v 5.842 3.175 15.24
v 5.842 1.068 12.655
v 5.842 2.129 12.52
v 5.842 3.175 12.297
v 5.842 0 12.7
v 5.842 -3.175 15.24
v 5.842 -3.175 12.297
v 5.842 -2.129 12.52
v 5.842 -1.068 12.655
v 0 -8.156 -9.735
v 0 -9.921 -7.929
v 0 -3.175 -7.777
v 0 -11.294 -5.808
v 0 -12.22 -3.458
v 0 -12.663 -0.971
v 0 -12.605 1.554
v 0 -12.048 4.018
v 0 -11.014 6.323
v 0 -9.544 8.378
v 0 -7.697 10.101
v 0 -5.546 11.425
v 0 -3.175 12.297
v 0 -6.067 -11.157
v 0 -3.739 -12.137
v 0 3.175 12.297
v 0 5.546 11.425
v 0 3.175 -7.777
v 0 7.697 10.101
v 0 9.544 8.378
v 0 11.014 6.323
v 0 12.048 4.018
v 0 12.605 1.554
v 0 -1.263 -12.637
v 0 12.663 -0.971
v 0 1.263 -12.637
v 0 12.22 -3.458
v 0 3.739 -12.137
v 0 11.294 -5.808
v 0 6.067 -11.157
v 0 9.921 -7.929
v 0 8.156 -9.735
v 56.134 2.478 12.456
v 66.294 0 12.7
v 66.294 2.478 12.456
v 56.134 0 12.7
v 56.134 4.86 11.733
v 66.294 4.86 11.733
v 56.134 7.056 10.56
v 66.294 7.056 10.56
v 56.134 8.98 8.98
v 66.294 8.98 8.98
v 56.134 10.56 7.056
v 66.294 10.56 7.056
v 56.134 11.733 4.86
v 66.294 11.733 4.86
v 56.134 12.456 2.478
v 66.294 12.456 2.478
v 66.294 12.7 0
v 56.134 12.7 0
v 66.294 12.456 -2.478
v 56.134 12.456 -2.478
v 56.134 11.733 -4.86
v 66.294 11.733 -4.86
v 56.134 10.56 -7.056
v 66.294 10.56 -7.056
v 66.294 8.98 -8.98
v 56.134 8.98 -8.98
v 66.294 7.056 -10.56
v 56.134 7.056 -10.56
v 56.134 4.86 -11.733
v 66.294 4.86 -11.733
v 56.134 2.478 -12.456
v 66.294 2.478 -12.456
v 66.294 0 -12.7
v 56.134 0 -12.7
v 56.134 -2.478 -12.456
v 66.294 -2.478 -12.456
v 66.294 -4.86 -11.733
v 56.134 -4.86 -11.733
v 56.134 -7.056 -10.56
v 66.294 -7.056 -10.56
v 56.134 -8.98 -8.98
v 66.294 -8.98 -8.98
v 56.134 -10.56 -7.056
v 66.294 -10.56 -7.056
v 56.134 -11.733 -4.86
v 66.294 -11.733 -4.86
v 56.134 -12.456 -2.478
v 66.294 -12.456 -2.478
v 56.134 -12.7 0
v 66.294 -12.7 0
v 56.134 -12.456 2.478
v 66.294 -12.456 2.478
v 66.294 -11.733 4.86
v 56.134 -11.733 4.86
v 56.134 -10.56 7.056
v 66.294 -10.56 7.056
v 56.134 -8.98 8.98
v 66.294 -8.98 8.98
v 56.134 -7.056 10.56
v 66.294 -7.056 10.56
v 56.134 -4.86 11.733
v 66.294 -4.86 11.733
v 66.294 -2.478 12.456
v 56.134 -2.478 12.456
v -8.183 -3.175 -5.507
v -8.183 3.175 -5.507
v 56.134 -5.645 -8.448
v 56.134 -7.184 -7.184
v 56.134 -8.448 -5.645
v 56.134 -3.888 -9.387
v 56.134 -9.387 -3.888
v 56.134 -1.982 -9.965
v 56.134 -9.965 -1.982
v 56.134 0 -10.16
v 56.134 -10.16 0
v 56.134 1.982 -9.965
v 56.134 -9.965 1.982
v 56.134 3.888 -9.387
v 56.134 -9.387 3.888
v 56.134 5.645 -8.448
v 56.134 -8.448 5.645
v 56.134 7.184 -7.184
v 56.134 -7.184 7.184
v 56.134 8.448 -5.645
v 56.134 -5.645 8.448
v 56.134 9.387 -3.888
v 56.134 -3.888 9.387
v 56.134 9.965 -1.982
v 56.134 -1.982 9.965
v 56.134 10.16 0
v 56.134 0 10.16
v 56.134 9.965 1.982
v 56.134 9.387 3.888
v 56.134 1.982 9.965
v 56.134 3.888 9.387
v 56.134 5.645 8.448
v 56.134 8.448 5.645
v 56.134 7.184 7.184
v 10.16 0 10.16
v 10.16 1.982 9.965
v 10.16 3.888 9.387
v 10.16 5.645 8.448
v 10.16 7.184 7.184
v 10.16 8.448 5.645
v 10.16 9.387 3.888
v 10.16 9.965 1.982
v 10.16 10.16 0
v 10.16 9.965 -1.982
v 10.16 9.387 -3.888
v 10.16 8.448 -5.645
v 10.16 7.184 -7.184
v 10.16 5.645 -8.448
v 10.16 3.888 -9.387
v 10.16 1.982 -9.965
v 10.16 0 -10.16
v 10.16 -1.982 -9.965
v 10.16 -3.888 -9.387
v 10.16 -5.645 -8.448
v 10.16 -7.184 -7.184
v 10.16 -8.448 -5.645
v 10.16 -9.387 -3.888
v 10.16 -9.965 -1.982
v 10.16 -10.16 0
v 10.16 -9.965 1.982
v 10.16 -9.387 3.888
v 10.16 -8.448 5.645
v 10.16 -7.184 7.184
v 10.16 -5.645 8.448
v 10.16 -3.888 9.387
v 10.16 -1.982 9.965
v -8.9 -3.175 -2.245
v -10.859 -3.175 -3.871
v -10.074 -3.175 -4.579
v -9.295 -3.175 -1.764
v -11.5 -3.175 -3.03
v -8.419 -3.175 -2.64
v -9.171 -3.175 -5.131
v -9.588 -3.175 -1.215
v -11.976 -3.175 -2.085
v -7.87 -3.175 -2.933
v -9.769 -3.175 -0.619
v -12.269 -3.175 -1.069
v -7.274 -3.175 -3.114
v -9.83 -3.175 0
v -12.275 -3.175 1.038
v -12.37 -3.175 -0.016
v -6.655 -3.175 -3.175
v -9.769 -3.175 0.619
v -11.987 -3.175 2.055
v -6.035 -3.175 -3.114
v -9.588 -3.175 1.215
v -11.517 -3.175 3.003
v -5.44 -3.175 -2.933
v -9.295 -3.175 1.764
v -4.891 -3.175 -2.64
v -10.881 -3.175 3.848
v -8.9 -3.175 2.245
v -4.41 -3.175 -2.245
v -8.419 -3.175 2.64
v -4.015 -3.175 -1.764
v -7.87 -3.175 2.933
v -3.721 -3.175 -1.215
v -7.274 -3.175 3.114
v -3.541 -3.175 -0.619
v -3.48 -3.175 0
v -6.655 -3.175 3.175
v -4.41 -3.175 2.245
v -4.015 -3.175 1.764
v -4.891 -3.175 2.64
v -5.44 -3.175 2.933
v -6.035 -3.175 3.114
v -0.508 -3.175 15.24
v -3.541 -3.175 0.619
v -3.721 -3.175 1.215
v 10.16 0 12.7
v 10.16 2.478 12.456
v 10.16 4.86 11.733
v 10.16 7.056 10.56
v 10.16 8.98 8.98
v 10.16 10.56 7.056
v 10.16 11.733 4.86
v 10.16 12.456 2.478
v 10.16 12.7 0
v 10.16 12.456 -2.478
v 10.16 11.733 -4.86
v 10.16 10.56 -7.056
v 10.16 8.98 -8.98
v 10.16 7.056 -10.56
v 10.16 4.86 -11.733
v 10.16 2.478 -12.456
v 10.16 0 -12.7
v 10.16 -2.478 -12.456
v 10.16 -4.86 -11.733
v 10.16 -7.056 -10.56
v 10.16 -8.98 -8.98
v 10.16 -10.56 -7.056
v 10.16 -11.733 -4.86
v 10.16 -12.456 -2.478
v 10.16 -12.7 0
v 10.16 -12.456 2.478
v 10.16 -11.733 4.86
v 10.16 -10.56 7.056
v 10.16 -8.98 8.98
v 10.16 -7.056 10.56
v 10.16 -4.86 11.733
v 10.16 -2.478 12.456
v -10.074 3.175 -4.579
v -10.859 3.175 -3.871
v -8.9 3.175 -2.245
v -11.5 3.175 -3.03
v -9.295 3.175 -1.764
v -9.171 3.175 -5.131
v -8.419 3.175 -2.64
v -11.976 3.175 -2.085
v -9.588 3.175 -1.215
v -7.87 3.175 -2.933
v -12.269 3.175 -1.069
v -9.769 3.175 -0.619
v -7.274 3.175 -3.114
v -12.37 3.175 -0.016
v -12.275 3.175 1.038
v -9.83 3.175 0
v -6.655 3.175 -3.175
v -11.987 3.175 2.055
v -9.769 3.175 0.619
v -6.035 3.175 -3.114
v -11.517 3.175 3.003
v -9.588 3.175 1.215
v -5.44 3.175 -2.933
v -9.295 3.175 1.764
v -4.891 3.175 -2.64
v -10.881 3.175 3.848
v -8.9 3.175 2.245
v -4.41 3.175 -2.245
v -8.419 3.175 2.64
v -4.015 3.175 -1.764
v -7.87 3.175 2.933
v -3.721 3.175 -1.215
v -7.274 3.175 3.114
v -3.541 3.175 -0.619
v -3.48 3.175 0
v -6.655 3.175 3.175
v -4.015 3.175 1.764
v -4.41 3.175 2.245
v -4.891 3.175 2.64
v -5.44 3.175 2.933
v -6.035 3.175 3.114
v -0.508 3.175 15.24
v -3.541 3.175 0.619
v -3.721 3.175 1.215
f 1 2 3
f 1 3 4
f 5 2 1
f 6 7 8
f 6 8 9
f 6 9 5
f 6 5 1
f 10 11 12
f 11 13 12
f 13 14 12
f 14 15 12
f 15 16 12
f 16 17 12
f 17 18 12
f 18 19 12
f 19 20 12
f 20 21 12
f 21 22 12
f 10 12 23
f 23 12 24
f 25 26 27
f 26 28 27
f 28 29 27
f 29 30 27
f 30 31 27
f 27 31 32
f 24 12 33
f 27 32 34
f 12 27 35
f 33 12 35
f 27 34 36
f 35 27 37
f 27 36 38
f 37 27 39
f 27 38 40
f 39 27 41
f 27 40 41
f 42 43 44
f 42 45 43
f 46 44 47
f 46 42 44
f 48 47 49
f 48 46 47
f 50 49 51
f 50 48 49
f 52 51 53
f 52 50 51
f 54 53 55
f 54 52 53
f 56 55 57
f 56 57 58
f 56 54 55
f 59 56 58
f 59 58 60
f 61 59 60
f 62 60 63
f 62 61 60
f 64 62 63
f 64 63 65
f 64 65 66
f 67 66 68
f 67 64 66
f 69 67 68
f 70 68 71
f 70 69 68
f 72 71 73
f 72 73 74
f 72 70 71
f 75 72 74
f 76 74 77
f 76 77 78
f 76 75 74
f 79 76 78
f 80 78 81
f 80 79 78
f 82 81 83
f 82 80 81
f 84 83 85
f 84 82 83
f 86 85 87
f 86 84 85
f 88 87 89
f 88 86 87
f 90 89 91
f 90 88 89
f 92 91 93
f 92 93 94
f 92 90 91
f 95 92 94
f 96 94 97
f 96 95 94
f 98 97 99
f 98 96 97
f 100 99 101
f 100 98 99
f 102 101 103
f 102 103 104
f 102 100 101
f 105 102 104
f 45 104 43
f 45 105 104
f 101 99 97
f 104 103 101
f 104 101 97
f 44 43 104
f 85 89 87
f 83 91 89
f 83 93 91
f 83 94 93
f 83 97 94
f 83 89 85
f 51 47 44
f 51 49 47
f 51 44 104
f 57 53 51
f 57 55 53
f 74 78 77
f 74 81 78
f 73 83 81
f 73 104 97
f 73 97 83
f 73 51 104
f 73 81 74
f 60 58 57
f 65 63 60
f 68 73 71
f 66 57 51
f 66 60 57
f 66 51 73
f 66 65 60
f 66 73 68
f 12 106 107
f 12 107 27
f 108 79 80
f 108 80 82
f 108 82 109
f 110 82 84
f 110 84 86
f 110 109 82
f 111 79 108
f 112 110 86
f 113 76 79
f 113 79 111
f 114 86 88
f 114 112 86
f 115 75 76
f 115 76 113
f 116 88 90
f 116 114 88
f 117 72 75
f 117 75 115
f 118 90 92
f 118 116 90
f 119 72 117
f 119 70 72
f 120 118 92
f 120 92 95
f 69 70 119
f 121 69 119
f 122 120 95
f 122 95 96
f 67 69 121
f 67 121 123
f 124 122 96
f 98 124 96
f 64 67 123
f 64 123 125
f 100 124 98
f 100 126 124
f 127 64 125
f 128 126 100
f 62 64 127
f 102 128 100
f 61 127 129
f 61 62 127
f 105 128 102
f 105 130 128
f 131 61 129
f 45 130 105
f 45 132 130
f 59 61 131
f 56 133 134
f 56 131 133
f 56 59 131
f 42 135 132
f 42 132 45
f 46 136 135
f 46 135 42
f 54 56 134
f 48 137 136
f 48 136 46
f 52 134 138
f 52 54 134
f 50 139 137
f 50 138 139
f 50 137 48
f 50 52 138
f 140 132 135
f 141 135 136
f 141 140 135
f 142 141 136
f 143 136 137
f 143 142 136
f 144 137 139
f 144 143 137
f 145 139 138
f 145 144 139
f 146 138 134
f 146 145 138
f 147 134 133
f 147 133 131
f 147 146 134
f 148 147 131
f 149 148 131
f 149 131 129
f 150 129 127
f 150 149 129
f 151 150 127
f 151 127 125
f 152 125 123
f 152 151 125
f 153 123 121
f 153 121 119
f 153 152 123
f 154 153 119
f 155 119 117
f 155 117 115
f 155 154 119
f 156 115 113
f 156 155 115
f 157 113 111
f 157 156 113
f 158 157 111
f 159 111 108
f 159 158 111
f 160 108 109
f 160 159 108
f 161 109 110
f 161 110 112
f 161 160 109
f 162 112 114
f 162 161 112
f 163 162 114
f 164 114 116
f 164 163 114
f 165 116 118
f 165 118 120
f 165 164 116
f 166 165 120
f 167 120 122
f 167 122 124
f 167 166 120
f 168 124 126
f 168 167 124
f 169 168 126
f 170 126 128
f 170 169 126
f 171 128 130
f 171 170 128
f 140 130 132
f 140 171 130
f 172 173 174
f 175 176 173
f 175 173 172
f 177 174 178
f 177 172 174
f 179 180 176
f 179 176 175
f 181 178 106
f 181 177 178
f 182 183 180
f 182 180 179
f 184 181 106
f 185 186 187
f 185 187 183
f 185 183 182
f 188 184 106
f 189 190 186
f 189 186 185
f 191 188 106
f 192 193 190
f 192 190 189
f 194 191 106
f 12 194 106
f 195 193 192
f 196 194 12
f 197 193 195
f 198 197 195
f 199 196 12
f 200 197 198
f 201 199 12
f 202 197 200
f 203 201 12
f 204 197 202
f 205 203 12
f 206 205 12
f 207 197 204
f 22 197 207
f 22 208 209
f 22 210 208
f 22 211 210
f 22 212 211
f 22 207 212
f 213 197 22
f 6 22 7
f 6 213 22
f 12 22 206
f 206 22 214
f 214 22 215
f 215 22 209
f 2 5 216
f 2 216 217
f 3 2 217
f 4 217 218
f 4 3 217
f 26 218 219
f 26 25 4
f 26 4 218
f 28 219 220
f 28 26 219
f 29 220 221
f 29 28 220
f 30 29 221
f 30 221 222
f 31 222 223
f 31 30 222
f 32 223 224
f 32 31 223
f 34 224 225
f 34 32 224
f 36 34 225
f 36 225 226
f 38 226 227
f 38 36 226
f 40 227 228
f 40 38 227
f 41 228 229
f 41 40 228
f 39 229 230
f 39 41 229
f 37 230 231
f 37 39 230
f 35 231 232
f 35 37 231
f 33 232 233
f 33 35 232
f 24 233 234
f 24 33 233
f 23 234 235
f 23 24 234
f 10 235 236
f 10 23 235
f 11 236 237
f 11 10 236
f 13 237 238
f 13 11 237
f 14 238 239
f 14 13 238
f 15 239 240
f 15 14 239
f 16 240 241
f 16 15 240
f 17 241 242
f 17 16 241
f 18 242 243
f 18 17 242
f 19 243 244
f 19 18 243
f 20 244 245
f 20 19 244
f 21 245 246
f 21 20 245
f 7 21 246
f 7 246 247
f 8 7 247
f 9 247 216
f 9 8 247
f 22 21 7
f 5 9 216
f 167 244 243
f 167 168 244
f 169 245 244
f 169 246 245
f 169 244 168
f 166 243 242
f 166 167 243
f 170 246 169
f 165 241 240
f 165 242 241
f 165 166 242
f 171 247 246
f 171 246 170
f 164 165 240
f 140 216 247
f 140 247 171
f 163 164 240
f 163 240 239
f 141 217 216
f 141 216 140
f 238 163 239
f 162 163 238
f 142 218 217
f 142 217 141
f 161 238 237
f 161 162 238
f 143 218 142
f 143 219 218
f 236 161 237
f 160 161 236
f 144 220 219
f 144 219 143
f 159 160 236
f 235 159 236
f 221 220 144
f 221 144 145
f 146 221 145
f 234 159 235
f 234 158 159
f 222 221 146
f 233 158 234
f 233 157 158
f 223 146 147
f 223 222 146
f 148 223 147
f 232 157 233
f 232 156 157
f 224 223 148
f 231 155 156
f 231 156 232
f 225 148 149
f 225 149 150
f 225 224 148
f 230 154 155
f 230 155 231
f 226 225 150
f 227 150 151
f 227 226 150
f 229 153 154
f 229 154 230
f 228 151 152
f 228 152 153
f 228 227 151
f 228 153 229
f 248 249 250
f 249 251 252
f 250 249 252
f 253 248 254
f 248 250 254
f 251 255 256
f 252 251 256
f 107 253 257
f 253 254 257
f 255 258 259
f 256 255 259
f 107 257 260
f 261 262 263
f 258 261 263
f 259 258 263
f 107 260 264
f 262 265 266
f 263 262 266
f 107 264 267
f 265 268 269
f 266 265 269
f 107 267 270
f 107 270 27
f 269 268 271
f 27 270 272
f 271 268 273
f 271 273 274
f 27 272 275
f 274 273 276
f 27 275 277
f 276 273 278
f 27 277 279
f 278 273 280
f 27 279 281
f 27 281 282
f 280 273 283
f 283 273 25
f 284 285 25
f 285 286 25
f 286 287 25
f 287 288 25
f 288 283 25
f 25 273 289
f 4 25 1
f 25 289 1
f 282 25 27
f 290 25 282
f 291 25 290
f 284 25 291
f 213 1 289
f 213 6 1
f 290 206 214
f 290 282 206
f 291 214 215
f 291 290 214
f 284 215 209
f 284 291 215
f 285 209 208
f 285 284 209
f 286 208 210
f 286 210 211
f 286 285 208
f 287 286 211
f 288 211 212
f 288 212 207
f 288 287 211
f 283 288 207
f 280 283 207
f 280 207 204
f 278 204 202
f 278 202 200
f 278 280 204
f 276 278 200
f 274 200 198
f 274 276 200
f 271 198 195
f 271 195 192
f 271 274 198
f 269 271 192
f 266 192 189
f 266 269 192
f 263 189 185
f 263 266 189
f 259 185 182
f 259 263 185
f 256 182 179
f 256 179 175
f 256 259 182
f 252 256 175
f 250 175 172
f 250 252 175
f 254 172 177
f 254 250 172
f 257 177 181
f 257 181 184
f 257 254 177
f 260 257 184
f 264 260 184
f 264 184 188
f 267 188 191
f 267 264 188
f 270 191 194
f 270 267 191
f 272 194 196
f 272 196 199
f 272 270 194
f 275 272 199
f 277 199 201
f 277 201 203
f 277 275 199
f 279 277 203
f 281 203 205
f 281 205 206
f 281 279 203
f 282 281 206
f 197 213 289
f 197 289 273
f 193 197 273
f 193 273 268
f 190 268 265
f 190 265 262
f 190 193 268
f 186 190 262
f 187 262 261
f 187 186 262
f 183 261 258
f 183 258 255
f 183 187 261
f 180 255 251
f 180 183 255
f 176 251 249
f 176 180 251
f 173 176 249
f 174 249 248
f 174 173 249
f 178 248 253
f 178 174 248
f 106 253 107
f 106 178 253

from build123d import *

# Parameters (mm, degrees)
F0_R     = 3.175
F0_W     = 5.842
F0_H     = 12.7
F1_DEPTH = 3.175


with BuildPart() as f1:
    # F0 (on Front) → F1 (new body, symmetric)
    with BuildSketch(Plane.XZ):
        with BuildLine():
            Line((-0.9398, 0), (0, 0))
            Line((0, 0), (0, 12.7))
            Line((0, 12.7), (5.842, 12.7))
            Line((5.842, 12.7), (5.842, 15.24))
            Line((5.842, 15.24), (-0.508, 15.24))
            Line((-0.508, 15.24), (-10.88063, 3.847543))
            ThreePointArc((-10.88063, 3.847543), (-4.591961, 5.329721), (-0.9398, 0))
        make_face()
        with BuildLine():
            ThreePointArc((-8.182663, -5.506983), (-3.195791, -4.549339), (-0.9398, 0))
            ThreePointArc((-0.9398, 0), (-4.591961, 5.329721), (-10.88063, 3.847543))
            ThreePointArc((-10.88063, 3.847543), (-12.145978, -1.583727), (-8.182663, -5.506983))
        make_face()
        with Locations((-6.6548, 0)):
            Circle(F0_R, mode=Mode.SUBTRACT)
        with BuildLine():
            Line((5.842, 0), (0, 0))
            Line((0, 0), (-0.9398, 0))
            ThreePointArc((-0.9398, 0), (-3.195791, -4.549339), (-8.182663, -5.506983))
            Line((-8.182663, -5.506983), (5.842, -9.398))
            Line((5.842, -9.398), (5.842, 0))
        make_face()
        with Locations((2.921, 6.35)):
            Rectangle(F0_W, F0_H)
    extrude(amount=F1_DEPTH, both=True)

    # F0 (on Front) → F2 (revolve)
    with BuildSketch(Plane.XZ):
        Polygon((5.842, 12.7), (5.842, 0), (66.294, 0), (66.294, 12.7), (56.134, 12.7), (56.134, 10.16), (10.16, 10.16), (10.16, 12.7), align=None)
        with Locations((2.921, 6.35)):
            Rectangle(F0_W, F0_H)
    revolve(axis=Axis((33.147, 0, 0), (-1, 0, 0)))


solid = f1.part
